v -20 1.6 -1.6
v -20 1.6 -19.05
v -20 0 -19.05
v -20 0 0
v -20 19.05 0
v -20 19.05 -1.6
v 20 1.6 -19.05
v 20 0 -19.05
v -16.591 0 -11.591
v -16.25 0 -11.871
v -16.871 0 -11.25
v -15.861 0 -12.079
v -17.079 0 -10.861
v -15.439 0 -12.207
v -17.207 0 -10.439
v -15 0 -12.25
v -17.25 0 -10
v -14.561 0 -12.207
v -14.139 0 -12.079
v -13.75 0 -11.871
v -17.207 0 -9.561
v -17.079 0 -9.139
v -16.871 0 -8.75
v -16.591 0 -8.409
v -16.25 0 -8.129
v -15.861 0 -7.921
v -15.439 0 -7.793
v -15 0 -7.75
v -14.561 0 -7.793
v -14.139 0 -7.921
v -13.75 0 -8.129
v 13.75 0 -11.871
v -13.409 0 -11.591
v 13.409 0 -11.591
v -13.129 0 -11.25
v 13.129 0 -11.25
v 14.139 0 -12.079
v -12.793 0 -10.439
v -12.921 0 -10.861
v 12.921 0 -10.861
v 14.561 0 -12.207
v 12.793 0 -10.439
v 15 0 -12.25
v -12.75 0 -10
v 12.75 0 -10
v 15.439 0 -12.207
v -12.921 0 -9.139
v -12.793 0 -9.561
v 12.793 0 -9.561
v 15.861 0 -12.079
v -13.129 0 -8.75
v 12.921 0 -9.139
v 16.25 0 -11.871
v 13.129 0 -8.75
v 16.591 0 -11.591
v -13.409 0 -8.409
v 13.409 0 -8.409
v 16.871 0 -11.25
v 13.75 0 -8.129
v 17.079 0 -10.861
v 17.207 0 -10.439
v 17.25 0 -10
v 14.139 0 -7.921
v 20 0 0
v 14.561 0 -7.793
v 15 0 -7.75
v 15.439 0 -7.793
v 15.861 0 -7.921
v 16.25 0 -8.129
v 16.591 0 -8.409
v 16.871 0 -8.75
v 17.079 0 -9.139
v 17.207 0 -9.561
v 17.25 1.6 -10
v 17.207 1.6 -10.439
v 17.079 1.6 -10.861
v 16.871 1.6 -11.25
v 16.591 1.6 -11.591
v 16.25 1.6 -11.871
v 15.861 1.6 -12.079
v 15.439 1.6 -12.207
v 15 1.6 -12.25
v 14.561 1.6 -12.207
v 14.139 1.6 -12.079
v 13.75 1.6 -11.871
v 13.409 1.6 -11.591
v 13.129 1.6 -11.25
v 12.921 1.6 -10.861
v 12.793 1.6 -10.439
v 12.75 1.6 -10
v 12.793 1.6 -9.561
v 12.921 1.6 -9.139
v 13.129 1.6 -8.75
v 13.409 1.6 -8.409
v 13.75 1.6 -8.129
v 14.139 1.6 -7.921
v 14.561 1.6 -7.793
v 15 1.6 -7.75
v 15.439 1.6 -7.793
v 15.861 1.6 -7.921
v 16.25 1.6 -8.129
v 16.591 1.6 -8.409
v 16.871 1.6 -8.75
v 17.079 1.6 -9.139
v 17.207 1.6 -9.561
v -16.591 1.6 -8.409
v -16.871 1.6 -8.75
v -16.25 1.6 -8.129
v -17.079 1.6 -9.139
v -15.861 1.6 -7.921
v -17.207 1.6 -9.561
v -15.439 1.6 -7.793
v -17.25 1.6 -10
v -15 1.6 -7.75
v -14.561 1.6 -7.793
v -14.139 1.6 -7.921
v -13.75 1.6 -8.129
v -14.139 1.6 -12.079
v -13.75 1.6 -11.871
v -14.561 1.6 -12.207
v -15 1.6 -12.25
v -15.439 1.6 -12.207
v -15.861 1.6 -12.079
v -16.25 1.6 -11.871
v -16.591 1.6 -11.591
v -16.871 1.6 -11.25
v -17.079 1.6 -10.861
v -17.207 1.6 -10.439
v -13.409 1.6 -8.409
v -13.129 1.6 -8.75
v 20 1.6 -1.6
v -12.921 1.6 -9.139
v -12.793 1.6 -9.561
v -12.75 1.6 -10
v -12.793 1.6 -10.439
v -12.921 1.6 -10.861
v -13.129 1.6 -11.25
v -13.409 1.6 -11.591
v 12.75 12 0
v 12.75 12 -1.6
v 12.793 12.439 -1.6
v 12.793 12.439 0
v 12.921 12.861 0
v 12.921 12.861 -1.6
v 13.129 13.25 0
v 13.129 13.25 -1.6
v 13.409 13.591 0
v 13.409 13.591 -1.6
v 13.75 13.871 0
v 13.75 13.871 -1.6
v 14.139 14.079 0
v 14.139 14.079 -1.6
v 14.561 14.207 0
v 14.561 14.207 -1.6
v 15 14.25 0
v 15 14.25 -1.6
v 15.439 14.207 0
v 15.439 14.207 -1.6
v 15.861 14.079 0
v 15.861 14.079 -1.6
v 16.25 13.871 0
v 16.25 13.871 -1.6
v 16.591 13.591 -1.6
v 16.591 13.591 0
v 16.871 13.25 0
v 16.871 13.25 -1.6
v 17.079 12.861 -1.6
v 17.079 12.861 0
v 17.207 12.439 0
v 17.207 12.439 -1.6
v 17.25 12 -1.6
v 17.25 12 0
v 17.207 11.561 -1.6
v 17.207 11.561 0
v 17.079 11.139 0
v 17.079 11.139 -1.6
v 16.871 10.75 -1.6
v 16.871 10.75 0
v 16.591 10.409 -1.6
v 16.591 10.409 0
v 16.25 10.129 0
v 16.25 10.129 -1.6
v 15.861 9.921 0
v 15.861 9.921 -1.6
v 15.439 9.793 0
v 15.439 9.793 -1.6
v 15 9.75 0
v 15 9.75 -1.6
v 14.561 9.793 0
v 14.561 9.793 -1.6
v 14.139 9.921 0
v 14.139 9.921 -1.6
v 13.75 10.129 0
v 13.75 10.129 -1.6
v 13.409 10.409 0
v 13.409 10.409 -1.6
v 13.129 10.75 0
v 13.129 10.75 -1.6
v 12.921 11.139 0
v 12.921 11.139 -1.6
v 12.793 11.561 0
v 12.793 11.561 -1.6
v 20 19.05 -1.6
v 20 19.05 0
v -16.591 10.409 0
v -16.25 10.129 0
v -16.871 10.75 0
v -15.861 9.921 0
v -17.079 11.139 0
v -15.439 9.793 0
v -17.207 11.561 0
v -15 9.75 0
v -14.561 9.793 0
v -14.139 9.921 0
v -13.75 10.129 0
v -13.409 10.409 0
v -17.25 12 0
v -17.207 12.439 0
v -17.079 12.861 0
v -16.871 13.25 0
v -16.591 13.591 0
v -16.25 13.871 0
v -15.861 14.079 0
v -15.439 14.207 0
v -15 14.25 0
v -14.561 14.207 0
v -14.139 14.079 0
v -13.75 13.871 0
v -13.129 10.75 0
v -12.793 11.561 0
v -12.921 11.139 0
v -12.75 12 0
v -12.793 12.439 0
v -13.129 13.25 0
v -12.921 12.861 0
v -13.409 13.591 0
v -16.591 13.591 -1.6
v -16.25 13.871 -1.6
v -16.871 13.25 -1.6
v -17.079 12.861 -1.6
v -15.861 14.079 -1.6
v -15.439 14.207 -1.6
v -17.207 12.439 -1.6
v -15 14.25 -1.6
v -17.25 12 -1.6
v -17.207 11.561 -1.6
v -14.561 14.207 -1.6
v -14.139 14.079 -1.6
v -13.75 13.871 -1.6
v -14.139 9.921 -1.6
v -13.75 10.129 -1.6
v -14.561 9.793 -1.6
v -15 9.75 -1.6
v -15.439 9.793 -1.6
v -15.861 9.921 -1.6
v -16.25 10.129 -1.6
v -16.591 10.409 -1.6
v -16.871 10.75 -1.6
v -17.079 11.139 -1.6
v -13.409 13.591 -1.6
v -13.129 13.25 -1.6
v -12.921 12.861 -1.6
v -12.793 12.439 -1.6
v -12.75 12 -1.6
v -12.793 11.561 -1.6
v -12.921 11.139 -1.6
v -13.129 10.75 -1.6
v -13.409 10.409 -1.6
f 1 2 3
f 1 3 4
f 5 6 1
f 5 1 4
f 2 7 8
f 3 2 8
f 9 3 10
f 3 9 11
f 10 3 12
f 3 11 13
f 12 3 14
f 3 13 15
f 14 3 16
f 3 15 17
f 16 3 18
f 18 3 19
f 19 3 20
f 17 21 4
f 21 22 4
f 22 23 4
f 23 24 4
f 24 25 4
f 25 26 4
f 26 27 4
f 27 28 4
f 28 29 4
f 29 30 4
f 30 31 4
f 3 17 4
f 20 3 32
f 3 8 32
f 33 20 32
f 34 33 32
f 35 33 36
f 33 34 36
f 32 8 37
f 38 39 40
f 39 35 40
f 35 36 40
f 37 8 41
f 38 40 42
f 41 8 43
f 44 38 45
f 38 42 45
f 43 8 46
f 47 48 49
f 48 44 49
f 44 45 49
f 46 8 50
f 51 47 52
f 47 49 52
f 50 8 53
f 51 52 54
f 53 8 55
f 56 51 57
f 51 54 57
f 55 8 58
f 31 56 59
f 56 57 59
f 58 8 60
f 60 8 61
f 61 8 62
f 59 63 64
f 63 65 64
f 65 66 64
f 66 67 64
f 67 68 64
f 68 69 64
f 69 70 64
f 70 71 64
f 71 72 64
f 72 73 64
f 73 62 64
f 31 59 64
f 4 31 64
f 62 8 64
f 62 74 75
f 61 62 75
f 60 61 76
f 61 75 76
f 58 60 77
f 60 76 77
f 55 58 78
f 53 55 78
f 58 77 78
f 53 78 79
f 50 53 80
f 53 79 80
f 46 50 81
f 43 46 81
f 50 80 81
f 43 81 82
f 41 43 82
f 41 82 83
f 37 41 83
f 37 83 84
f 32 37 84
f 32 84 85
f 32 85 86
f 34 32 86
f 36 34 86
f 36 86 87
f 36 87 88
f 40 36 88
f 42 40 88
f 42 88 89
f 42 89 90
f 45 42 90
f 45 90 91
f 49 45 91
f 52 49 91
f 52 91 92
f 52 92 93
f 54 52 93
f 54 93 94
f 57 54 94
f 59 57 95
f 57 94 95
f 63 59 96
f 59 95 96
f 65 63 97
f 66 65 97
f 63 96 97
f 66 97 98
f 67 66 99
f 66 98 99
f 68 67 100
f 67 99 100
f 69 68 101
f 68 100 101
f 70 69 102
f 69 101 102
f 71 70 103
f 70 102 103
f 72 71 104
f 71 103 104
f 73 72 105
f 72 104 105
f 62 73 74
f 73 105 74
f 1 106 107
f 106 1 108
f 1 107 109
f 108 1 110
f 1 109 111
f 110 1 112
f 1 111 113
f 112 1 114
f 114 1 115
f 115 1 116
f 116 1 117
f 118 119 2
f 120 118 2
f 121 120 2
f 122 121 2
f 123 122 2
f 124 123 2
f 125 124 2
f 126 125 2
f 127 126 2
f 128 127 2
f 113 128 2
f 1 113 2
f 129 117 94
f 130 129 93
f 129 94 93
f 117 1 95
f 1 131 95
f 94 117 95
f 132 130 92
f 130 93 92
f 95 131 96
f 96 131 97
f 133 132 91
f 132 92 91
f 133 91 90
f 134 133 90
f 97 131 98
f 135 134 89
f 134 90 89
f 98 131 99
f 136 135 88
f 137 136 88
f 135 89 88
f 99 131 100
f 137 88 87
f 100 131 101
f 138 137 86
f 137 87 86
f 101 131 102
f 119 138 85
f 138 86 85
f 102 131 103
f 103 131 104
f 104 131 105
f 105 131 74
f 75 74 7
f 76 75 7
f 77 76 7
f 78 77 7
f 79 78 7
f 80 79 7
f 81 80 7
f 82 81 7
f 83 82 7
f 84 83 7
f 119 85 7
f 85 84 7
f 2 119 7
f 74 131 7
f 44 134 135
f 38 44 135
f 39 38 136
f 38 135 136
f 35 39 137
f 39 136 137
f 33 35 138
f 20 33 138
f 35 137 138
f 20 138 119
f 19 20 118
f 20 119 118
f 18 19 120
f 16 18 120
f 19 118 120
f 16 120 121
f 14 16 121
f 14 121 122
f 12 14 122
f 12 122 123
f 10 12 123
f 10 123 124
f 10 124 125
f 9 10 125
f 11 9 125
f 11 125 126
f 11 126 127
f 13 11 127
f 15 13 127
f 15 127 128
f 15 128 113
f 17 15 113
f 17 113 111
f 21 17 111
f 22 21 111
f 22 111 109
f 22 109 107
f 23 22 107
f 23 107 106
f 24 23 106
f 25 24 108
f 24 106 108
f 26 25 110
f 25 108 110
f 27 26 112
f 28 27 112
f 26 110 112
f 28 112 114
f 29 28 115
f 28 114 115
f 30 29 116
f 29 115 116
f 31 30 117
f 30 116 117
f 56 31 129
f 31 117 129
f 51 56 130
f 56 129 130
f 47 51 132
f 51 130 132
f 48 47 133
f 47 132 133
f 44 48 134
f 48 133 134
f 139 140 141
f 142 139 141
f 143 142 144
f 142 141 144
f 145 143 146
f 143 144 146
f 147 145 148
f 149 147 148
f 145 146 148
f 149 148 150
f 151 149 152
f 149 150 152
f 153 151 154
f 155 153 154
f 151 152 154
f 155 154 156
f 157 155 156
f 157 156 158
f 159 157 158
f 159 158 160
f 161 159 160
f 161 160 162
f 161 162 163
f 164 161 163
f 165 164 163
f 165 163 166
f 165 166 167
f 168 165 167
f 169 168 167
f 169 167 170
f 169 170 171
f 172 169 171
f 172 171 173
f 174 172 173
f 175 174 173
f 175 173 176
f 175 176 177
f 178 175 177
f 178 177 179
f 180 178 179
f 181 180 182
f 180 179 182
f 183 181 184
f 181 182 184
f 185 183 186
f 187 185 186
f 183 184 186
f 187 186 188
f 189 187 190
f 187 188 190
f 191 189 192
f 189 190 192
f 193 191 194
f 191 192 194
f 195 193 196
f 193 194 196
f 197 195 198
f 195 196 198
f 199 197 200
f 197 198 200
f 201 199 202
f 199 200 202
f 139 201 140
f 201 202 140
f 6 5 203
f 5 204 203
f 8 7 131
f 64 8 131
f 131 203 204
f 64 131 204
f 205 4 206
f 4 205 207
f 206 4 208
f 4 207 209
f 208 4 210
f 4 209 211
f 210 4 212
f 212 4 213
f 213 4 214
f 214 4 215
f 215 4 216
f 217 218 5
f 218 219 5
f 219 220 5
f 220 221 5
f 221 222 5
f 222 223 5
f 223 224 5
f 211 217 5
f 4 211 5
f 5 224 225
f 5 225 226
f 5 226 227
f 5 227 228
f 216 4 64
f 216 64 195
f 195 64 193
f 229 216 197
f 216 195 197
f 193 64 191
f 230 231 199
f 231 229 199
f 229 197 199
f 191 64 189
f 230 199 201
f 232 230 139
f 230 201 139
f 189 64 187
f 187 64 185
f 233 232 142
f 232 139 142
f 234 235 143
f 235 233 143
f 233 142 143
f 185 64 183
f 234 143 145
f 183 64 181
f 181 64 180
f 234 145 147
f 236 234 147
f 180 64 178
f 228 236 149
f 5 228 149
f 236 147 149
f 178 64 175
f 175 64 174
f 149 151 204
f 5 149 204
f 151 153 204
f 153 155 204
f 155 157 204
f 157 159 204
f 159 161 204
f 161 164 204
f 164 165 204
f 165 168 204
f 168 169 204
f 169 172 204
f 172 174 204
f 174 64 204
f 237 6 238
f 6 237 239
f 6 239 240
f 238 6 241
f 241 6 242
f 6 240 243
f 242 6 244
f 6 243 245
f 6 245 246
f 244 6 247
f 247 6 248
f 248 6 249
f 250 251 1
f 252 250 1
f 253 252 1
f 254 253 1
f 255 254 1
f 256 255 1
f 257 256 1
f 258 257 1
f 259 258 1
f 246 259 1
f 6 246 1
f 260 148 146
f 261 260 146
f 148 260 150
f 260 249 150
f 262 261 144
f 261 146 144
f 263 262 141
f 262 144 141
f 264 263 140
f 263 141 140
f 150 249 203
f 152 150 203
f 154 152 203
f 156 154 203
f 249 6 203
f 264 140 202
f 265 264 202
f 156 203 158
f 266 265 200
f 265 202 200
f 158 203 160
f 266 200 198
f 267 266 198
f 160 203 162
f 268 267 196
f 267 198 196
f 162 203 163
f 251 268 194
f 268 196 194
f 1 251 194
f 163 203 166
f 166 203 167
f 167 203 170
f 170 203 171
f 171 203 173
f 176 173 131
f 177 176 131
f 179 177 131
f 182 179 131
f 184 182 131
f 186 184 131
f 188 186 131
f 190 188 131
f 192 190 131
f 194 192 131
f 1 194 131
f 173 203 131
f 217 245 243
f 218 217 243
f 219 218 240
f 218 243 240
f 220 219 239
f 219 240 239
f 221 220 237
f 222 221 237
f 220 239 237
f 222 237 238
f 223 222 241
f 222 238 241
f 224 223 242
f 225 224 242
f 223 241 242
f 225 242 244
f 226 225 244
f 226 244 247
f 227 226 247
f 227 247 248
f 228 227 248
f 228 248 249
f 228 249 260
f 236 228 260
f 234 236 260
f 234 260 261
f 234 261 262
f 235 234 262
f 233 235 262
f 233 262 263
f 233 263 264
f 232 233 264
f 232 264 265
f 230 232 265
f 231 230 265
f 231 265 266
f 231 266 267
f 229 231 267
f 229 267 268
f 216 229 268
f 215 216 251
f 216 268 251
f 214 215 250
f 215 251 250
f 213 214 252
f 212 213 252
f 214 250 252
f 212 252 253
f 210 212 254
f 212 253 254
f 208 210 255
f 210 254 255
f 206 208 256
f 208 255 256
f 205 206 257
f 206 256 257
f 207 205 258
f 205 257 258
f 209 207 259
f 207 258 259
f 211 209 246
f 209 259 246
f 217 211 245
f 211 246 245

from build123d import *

# Parameters (mm, degrees)
BOSS_EXTRUDE1_DEPTH  = 20
M4_CLEARANCE_HOLE1_D = 4.5
M4_CLEARANCE_HOLE2_D = 4.5


with BuildPart() as part:
    # Sketch1 → Boss-Extrude1 (new body, symmetric)
    with BuildSketch(Plane(origin=(0, 0, 0), x_dir=(0, 0, -1), z_dir=(1, 0, 0))):
        Polygon((0, 0), (0, 19.05), (1.6, 19.05), (1.6, 1.6), (19.05, 1.6), (19.05, 0), align=None)
    extrude(amount=BOSS_EXTRUDE1_DEPTH, both=True)

    # M4 Clearance Hole1 (through all)
    with Locations(Plane.XY):
        with Locations((-15, 12), (15, 12)):
            Hole(M4_CLEARANCE_HOLE1_D / 2)

    # M4 Clearance Hole2 (through all)
    with Locations(Plane(origin=(0, 0, 0), x_dir=(-1, 0, 0), z_dir=(0, -1, 0))):
        with Locations((-15, 10), (15, 10)):
            Hole(M4_CLEARANCE_HOLE2_D / 2)


solid = part.part
